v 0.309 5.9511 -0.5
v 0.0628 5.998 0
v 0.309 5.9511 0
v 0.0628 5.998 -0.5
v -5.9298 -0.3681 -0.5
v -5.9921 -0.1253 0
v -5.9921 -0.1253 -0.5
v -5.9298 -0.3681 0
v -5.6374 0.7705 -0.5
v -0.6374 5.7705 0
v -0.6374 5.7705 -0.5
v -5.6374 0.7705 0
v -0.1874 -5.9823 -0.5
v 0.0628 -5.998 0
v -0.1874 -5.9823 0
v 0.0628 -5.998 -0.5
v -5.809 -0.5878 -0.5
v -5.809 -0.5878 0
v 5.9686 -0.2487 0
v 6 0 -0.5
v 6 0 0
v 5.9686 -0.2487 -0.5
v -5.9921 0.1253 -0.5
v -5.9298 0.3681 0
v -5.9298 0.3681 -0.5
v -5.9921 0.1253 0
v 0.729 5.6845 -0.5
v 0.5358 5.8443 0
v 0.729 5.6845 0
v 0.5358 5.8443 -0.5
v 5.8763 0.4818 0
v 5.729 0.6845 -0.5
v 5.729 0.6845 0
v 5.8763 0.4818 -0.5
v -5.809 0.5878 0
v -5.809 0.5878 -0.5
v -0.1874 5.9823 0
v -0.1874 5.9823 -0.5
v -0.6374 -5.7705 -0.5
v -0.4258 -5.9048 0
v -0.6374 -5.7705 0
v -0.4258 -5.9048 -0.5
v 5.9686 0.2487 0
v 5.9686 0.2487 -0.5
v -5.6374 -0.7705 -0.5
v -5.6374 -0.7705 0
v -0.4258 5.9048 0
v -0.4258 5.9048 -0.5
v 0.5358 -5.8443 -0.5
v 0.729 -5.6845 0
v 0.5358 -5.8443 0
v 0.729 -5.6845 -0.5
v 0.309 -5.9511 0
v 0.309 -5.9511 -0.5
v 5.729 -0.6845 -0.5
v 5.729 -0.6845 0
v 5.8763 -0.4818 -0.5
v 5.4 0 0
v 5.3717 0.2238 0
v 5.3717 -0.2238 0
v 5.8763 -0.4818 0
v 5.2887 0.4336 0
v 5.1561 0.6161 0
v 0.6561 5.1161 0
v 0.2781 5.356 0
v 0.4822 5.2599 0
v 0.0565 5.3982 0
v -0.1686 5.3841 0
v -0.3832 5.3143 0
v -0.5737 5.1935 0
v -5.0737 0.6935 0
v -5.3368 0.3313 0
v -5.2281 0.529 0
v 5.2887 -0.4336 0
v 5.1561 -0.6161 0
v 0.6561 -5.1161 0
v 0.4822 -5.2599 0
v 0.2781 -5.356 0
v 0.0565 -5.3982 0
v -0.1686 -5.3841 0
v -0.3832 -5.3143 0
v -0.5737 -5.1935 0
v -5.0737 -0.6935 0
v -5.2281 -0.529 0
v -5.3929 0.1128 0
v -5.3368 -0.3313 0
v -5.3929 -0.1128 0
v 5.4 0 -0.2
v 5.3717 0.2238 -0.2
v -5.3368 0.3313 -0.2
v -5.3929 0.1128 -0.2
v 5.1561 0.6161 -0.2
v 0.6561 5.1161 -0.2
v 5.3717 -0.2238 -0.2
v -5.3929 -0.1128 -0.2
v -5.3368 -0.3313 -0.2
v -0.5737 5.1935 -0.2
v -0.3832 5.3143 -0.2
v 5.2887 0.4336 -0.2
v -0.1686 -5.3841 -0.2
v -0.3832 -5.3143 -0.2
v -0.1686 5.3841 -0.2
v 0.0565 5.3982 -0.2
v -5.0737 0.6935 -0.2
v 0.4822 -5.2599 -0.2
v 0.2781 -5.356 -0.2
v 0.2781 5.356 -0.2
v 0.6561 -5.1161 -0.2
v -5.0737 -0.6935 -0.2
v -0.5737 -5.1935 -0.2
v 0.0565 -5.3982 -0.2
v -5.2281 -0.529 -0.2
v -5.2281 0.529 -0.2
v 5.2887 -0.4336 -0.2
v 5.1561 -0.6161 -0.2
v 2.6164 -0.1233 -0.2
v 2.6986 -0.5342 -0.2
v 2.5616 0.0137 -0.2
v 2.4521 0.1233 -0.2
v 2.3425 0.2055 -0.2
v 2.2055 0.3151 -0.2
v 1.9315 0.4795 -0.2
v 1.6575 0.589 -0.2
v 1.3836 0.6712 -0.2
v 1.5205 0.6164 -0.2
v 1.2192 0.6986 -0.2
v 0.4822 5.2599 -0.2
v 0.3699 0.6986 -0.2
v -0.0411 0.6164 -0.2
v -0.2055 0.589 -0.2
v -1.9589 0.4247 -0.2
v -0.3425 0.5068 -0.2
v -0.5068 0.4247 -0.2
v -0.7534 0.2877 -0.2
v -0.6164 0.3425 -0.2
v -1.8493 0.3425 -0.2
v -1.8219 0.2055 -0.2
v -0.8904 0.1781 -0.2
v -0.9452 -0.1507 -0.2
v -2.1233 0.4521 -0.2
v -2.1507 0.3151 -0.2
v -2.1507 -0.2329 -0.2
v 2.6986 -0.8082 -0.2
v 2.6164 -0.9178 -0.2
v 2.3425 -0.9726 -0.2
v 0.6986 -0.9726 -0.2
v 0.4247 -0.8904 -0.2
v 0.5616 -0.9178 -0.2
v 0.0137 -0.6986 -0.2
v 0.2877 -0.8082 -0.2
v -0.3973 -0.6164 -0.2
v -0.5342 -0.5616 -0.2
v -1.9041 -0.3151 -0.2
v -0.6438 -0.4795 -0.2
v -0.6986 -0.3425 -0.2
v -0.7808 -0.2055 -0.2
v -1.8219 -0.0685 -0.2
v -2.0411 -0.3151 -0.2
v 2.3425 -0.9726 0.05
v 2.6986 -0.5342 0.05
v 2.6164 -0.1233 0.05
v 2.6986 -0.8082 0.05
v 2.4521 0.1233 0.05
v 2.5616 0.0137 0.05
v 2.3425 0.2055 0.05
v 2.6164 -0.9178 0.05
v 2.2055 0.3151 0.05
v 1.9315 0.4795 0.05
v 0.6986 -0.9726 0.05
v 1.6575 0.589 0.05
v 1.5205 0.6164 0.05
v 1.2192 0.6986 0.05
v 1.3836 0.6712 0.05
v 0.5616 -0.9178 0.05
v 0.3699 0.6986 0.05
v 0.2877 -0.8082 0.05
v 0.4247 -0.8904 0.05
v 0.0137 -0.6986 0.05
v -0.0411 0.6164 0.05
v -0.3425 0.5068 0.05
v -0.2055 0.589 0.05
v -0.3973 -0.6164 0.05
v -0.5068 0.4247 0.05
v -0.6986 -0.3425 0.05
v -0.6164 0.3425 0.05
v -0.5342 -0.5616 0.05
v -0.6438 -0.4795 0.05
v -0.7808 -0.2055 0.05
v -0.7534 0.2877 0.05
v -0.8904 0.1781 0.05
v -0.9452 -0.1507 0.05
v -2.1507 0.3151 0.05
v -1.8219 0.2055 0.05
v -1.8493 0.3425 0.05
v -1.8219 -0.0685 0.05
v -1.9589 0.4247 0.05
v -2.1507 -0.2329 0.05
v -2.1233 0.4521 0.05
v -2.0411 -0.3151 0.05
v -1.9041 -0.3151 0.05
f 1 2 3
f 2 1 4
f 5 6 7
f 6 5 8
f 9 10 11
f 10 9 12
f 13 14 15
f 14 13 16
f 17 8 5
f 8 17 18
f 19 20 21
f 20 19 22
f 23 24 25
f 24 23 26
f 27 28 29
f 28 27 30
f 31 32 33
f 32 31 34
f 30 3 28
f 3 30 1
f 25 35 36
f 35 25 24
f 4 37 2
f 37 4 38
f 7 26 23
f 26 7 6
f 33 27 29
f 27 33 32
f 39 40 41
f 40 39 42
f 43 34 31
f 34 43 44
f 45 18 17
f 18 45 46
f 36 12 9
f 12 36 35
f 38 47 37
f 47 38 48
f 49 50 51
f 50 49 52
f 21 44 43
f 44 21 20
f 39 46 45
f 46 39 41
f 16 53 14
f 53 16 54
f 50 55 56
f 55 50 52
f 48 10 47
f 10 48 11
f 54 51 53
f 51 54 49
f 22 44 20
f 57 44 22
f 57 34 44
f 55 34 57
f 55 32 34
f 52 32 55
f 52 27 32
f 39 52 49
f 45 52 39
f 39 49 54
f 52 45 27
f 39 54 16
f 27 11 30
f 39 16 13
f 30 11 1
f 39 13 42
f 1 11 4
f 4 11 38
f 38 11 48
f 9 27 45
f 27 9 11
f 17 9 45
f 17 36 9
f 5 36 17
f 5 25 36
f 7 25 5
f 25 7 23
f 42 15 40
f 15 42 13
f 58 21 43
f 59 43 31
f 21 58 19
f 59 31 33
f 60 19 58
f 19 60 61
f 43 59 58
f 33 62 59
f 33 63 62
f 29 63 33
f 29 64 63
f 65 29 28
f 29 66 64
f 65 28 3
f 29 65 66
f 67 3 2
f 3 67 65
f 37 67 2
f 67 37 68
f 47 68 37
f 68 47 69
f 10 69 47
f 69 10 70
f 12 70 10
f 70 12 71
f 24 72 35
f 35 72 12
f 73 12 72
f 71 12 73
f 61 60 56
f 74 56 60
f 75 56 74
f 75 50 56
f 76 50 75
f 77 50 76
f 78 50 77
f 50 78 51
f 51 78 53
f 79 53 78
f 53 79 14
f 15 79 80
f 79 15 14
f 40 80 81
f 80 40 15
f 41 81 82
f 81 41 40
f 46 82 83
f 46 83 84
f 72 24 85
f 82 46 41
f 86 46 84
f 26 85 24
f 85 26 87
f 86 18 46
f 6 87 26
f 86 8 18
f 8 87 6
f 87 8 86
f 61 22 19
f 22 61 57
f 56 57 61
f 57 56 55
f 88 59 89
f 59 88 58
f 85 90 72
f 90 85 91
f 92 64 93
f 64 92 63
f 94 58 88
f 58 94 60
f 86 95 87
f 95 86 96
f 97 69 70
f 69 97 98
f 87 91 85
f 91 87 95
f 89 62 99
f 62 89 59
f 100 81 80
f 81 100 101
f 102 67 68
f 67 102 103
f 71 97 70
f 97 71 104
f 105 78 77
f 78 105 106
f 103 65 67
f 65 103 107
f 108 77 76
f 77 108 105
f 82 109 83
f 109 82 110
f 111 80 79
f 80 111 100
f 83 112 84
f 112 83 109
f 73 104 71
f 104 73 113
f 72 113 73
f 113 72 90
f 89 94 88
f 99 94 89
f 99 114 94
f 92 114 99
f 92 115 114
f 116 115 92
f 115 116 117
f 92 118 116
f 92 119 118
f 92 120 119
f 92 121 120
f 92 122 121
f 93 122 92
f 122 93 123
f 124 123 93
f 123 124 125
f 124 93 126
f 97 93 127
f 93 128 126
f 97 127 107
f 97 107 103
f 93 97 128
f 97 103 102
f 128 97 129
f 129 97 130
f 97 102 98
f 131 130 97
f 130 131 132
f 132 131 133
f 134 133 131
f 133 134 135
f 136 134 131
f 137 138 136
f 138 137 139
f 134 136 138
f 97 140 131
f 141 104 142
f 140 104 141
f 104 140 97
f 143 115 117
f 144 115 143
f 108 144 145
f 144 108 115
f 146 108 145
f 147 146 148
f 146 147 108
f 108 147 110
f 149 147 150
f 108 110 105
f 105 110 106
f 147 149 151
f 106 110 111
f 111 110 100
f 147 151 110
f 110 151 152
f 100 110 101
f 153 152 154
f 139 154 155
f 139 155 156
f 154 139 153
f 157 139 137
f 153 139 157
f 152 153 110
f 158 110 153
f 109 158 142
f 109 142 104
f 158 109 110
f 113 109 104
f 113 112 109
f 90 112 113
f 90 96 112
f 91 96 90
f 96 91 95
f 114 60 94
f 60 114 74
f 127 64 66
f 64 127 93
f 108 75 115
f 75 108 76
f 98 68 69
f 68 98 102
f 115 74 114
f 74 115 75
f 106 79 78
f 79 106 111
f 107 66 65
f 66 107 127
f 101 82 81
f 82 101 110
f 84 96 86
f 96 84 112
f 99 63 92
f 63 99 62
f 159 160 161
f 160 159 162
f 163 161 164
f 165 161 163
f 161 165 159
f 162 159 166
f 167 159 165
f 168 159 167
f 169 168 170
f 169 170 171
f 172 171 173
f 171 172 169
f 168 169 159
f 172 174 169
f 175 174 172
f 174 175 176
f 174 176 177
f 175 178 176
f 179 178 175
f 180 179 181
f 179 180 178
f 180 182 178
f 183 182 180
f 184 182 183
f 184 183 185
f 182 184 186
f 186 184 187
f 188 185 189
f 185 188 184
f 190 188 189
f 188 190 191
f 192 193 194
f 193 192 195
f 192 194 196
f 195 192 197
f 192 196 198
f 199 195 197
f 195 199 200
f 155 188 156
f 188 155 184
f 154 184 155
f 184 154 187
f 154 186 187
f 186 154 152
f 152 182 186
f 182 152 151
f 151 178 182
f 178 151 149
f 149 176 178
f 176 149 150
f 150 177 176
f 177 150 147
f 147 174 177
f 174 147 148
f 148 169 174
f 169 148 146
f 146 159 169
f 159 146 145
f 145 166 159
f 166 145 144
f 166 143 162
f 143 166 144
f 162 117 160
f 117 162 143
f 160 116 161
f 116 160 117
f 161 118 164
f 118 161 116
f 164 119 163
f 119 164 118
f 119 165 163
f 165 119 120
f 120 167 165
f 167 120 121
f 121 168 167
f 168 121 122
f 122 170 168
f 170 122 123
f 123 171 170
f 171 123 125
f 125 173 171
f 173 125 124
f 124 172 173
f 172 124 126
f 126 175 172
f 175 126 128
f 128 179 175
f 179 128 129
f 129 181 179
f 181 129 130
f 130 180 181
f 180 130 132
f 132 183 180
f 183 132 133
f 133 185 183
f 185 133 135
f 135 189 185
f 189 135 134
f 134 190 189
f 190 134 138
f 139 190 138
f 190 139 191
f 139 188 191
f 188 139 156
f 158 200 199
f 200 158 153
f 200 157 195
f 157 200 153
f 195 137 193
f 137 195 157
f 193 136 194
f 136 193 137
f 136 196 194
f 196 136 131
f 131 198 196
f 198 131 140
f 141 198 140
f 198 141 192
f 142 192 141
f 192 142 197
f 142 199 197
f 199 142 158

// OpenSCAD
// Arbitrary signage
//
// by seedwire
// 11/15/2013
//

// preview[view:west, tilt:top]

// Pick the sign outline here!
outline = "diamond"; //[triangle,circle,no-circle,diamond]

// Draw or choose an image on one (or both) of the tabs!

/*[Drawing]*/
// Use the drawing?
use_drawing = "yes";//[yes,no]

// Use to scale the sign within outline
my_scale = 100.0; //[1:200]

// Use to position within outline (X)
my_x = 0.0; //[-50:50]

// Use to position within outline (Y)
my_y = 0.0; //[-50:50]

// Draw your sign here!
my_sign = [[[-1.0000000000000016,1.0000000000000016],[1.0000000000000016,1.0000000000000016],[1.0000000000000016,-1.0000000000000016],[-1.0000000000000016,-1.0000000000000016],[-1.7808219178082192,-8.904109589041095],[1.5068493150684932,-9.452054794520548],[2.054794520547945,-7.808219178082192],[2.054794520547945,-7.808219178082192],[3.4246575342465753,-6.986301369863014],[3.4246575342465753,-6.986301369863014],[4.794520547945205,-6.438356164383562],[5.616438356164384,-5.342465753424658],[5.616438356164384,-5.342465753424658],[6.164383561643835,-3.9726027397260277],[6.164383561643835,-3.9726027397260277],[6.438356164383562,-2.6027397260273974],[6.438356164383562,-2.6027397260273974],[6.712328767123288,-1.2328767123287672],[6.712328767123288,-1.2328767123287672],[6.986301369863014,0.136986301369863],[6.986301369863014,0.136986301369863],[7.534246575342466,1.5068493150684932],[7.534246575342466,1.5068493150684932],[8.082191780821917,2.8767123287671232],[8.904109589041095,4.2465753424657535],[9.178082191780822,5.616438356164384],[9.726027397260275,6.986301369863014],[9.726027397260275,8.356164383561644],[9.726027397260275,9.726027397260275],[9.726027397260275,11.095890410958905],[9.726027397260275,12.465753424657535],[9.726027397260275,13.835616438356164],[9.726027397260275,15.205479452054796],[9.726027397260275,16.575342465753426],[9.726027397260275,17.945205479452056],[9.726027397260275,19.315068493150687],[9.726027397260275,20.684931506849317],[9.726027397260275,22.054794520547947],[9.726027397260275,23.424657534246577],[9.452054794520548,24.794520547945208],[9.178082191780822,26.164383561643834],[8.082191780821917,26.986301369863014],[6.712328767123288,26.986301369863014],[5.342465753424658,26.986301369863014],[3.9726027397260277,26.71232876712329],[2.6027397260273974,26.438356164383563],[1.2328767123287672,26.164383561643834],[-0.136986301369863,25.616438356164384],[-1.2328767123287672,24.52054794520548],[-2.054794520547945,23.424657534246577],[-3.1506849315068495,22.054794520547947],[-3.9726027397260277,20.684931506849317],[-4.794520547945205,19.315068493150687],[-5.342465753424658,17.945205479452056],[-5.89041095890411,16.575342465753426],[-6.164383561643835,15.205479452054796],[-6.712328767123288,13.835616438356164],[-6.986301369863014,12.191780821917808],[-6.986301369863014,10.821917808219178],[-6.986301369863014,9.452054794520548],[-6.986301369863014,8.082191780821917],[-6.986301369863014,6.712328767123288],[-6.986301369863014,5.342465753424658],[-6.986301369863014,3.6986301369863015],[-6.712328767123288,2.328767123287671],[-6.438356164383562,0.9589041095890412],[-6.164383561643835,-0.410958904109589],[-5.89041095890411,-2.054794520547945],[-5.068493150684931,-3.4246575342465753],[-4.2465753424657535,-5.068493150684931],[-3.4246575342465753,-6.164383561643835],[-2.8767123287671232,-7.534246575342466],[-0.684931506849315,-18.21917808219178],[-2.054794520547945,-18.21917808219178],[-3.4246575342465753,-18.493150684931507],[-4.2465753424657535,-19.589041095890412],[-4.52054794520548,-21.232876712328768],[-3.1506849315068495,-21.506849315068493],[-1.7808219178082192,-21.506849315068493],[-0.410958904109589,-21.506849315068493],[0.9589041095890412,-21.506849315068493],[2.328767123287671,-21.506849315068493],[3.1506849315068495,-20.410958904109588],[3.1506849315068495,-19.041095890410958],[0.684931506849315,-18.21917808219178]],[[4,5,6,7,8,9,10,11,12,13,14,15,16,17,18,19,20,21,22,23,24,25,26,27,28,29,30,31,32,33,34,35,36,37,38,39,40,41,42,43,44,45,46,47,48,49,50,51,52,53,54,55,56,57,58,59,60,61,62,63,64,65,66,67,68,69,70,71],[72,73,74,75,76,77,78,79,80,81,82,83,84]]]; //[draw_polygon:100x100]

/*[Image]*/

// Use the image file?
use_image = "no"; //[yes,no]

// Load a 100x100 pixel image
image_file = "image-surface.dat"; // [image_surface:100x100]

// Use to scale the image within outline
my_image_scale = 100.0; //[1:200]

// Use to scale the image height within outline
my_image_height = 100.0; //[1:200]

// Use to position image within outline (X)
my_image_x = 0.0; //[-50:50]

// Use to position image within outline (Y)
my_image_y = 0.0; //[-50:50]


/*[Hidden]*/
$fn=25;

if(use_drawing=="yes"){ intersection() {
	translate([0,0,5/4]) scale([0.9,0.9,5]) outline();
	union() {
		color([1,0,0]) scale([my_scale/100.0, my_scale/100.0, 1.0]) scale([0.1,0.1,1]) translate([my_y,my_x,-0.2]) rotate(-90,[0,0,1]) linear_extrude(height=0.25) polygon(points = my_sign[0], paths = my_sign[1]);
	}
}}

if(use_image=="yes") {
	intersection() {
	translate([0,0,5/4]) scale([0.9,0.9,5]) outline();
	union() {
	
	color([1,0,0]) scale([my_image_scale/200,my_image_scale/200,my_image_height/200.0]) translate([my_image_y,my_image_x,-0.2]) rotate(-90,[0,0,1]) surface(file=image_file, center=true, convexity=5);  	
	}
}}

outline();


module outline() 
{
if(outline == "triangle") {
	difference() { 
		translate([0,0,-0.5]) hull() {
		translate([-3,-5,0]) cylinder(r=1,h=0.5);
		translate([-3,5,0]) cylinder(r=1,h=0.5);
		translate([5,0,0]) cylinder(r=1,h=0.5);
		}		
		translate([0,0,-0.2]) scale([0.9,0.9,1]) hull() {
		translate([-3,-5,0]) cylinder(r=1,h=0.25);
		translate([-3,5,0]) cylinder(r=1,h=0.25);
		translate([5,0,0]) cylinder(r=1,h=0.25);
		}		

	}
	
} else if(outline == "circle") {
	difference() { 
		translate([0,0,-0.5]) cylinder(r=5,h=0.5);
		translate([0,0,-0.2]) scale([0.9,0.9,1]) cylinder(r=5,h=0.5);		
	}
} else if(outline == "no-circle") {
	difference() { 
		translate([0,0,-0.5]) cylinder(r=5,h=0.5);
		translate([0,0,-0.2]) scale([0.9,0.9,1]) cylinder(r=5,h=0.5);
	}
	translate([0,0,-0.15]) rotate(45,[0,0,1]) cube([1,9.5,0.25], center=true);
} else {
	difference() { 
		translate([0,0,-0.5]) hull() {
		translate([-0,-5,0]) cylinder(r=1,h=0.5);
		translate([-0,5,0]) cylinder(r=1,h=0.5);
		translate([5,0,0]) cylinder(r=1,h=0.5);
		translate([-5,0,0]) cylinder(r=1,h=0.5);

		}		
		translate([0,0,-0.2]) scale([0.9,0.9,1]) hull() {
		translate([-0,-5,0]) cylinder(r=1,h=0.5);
		translate([-0,5,0]) cylinder(r=1,h=0.5);
		translate([5,0,0]) cylinder(r=1,h=0.5);
		translate([-5,0,0]) cylinder(r=1,h=0.5);
		}		
	}
}
}
